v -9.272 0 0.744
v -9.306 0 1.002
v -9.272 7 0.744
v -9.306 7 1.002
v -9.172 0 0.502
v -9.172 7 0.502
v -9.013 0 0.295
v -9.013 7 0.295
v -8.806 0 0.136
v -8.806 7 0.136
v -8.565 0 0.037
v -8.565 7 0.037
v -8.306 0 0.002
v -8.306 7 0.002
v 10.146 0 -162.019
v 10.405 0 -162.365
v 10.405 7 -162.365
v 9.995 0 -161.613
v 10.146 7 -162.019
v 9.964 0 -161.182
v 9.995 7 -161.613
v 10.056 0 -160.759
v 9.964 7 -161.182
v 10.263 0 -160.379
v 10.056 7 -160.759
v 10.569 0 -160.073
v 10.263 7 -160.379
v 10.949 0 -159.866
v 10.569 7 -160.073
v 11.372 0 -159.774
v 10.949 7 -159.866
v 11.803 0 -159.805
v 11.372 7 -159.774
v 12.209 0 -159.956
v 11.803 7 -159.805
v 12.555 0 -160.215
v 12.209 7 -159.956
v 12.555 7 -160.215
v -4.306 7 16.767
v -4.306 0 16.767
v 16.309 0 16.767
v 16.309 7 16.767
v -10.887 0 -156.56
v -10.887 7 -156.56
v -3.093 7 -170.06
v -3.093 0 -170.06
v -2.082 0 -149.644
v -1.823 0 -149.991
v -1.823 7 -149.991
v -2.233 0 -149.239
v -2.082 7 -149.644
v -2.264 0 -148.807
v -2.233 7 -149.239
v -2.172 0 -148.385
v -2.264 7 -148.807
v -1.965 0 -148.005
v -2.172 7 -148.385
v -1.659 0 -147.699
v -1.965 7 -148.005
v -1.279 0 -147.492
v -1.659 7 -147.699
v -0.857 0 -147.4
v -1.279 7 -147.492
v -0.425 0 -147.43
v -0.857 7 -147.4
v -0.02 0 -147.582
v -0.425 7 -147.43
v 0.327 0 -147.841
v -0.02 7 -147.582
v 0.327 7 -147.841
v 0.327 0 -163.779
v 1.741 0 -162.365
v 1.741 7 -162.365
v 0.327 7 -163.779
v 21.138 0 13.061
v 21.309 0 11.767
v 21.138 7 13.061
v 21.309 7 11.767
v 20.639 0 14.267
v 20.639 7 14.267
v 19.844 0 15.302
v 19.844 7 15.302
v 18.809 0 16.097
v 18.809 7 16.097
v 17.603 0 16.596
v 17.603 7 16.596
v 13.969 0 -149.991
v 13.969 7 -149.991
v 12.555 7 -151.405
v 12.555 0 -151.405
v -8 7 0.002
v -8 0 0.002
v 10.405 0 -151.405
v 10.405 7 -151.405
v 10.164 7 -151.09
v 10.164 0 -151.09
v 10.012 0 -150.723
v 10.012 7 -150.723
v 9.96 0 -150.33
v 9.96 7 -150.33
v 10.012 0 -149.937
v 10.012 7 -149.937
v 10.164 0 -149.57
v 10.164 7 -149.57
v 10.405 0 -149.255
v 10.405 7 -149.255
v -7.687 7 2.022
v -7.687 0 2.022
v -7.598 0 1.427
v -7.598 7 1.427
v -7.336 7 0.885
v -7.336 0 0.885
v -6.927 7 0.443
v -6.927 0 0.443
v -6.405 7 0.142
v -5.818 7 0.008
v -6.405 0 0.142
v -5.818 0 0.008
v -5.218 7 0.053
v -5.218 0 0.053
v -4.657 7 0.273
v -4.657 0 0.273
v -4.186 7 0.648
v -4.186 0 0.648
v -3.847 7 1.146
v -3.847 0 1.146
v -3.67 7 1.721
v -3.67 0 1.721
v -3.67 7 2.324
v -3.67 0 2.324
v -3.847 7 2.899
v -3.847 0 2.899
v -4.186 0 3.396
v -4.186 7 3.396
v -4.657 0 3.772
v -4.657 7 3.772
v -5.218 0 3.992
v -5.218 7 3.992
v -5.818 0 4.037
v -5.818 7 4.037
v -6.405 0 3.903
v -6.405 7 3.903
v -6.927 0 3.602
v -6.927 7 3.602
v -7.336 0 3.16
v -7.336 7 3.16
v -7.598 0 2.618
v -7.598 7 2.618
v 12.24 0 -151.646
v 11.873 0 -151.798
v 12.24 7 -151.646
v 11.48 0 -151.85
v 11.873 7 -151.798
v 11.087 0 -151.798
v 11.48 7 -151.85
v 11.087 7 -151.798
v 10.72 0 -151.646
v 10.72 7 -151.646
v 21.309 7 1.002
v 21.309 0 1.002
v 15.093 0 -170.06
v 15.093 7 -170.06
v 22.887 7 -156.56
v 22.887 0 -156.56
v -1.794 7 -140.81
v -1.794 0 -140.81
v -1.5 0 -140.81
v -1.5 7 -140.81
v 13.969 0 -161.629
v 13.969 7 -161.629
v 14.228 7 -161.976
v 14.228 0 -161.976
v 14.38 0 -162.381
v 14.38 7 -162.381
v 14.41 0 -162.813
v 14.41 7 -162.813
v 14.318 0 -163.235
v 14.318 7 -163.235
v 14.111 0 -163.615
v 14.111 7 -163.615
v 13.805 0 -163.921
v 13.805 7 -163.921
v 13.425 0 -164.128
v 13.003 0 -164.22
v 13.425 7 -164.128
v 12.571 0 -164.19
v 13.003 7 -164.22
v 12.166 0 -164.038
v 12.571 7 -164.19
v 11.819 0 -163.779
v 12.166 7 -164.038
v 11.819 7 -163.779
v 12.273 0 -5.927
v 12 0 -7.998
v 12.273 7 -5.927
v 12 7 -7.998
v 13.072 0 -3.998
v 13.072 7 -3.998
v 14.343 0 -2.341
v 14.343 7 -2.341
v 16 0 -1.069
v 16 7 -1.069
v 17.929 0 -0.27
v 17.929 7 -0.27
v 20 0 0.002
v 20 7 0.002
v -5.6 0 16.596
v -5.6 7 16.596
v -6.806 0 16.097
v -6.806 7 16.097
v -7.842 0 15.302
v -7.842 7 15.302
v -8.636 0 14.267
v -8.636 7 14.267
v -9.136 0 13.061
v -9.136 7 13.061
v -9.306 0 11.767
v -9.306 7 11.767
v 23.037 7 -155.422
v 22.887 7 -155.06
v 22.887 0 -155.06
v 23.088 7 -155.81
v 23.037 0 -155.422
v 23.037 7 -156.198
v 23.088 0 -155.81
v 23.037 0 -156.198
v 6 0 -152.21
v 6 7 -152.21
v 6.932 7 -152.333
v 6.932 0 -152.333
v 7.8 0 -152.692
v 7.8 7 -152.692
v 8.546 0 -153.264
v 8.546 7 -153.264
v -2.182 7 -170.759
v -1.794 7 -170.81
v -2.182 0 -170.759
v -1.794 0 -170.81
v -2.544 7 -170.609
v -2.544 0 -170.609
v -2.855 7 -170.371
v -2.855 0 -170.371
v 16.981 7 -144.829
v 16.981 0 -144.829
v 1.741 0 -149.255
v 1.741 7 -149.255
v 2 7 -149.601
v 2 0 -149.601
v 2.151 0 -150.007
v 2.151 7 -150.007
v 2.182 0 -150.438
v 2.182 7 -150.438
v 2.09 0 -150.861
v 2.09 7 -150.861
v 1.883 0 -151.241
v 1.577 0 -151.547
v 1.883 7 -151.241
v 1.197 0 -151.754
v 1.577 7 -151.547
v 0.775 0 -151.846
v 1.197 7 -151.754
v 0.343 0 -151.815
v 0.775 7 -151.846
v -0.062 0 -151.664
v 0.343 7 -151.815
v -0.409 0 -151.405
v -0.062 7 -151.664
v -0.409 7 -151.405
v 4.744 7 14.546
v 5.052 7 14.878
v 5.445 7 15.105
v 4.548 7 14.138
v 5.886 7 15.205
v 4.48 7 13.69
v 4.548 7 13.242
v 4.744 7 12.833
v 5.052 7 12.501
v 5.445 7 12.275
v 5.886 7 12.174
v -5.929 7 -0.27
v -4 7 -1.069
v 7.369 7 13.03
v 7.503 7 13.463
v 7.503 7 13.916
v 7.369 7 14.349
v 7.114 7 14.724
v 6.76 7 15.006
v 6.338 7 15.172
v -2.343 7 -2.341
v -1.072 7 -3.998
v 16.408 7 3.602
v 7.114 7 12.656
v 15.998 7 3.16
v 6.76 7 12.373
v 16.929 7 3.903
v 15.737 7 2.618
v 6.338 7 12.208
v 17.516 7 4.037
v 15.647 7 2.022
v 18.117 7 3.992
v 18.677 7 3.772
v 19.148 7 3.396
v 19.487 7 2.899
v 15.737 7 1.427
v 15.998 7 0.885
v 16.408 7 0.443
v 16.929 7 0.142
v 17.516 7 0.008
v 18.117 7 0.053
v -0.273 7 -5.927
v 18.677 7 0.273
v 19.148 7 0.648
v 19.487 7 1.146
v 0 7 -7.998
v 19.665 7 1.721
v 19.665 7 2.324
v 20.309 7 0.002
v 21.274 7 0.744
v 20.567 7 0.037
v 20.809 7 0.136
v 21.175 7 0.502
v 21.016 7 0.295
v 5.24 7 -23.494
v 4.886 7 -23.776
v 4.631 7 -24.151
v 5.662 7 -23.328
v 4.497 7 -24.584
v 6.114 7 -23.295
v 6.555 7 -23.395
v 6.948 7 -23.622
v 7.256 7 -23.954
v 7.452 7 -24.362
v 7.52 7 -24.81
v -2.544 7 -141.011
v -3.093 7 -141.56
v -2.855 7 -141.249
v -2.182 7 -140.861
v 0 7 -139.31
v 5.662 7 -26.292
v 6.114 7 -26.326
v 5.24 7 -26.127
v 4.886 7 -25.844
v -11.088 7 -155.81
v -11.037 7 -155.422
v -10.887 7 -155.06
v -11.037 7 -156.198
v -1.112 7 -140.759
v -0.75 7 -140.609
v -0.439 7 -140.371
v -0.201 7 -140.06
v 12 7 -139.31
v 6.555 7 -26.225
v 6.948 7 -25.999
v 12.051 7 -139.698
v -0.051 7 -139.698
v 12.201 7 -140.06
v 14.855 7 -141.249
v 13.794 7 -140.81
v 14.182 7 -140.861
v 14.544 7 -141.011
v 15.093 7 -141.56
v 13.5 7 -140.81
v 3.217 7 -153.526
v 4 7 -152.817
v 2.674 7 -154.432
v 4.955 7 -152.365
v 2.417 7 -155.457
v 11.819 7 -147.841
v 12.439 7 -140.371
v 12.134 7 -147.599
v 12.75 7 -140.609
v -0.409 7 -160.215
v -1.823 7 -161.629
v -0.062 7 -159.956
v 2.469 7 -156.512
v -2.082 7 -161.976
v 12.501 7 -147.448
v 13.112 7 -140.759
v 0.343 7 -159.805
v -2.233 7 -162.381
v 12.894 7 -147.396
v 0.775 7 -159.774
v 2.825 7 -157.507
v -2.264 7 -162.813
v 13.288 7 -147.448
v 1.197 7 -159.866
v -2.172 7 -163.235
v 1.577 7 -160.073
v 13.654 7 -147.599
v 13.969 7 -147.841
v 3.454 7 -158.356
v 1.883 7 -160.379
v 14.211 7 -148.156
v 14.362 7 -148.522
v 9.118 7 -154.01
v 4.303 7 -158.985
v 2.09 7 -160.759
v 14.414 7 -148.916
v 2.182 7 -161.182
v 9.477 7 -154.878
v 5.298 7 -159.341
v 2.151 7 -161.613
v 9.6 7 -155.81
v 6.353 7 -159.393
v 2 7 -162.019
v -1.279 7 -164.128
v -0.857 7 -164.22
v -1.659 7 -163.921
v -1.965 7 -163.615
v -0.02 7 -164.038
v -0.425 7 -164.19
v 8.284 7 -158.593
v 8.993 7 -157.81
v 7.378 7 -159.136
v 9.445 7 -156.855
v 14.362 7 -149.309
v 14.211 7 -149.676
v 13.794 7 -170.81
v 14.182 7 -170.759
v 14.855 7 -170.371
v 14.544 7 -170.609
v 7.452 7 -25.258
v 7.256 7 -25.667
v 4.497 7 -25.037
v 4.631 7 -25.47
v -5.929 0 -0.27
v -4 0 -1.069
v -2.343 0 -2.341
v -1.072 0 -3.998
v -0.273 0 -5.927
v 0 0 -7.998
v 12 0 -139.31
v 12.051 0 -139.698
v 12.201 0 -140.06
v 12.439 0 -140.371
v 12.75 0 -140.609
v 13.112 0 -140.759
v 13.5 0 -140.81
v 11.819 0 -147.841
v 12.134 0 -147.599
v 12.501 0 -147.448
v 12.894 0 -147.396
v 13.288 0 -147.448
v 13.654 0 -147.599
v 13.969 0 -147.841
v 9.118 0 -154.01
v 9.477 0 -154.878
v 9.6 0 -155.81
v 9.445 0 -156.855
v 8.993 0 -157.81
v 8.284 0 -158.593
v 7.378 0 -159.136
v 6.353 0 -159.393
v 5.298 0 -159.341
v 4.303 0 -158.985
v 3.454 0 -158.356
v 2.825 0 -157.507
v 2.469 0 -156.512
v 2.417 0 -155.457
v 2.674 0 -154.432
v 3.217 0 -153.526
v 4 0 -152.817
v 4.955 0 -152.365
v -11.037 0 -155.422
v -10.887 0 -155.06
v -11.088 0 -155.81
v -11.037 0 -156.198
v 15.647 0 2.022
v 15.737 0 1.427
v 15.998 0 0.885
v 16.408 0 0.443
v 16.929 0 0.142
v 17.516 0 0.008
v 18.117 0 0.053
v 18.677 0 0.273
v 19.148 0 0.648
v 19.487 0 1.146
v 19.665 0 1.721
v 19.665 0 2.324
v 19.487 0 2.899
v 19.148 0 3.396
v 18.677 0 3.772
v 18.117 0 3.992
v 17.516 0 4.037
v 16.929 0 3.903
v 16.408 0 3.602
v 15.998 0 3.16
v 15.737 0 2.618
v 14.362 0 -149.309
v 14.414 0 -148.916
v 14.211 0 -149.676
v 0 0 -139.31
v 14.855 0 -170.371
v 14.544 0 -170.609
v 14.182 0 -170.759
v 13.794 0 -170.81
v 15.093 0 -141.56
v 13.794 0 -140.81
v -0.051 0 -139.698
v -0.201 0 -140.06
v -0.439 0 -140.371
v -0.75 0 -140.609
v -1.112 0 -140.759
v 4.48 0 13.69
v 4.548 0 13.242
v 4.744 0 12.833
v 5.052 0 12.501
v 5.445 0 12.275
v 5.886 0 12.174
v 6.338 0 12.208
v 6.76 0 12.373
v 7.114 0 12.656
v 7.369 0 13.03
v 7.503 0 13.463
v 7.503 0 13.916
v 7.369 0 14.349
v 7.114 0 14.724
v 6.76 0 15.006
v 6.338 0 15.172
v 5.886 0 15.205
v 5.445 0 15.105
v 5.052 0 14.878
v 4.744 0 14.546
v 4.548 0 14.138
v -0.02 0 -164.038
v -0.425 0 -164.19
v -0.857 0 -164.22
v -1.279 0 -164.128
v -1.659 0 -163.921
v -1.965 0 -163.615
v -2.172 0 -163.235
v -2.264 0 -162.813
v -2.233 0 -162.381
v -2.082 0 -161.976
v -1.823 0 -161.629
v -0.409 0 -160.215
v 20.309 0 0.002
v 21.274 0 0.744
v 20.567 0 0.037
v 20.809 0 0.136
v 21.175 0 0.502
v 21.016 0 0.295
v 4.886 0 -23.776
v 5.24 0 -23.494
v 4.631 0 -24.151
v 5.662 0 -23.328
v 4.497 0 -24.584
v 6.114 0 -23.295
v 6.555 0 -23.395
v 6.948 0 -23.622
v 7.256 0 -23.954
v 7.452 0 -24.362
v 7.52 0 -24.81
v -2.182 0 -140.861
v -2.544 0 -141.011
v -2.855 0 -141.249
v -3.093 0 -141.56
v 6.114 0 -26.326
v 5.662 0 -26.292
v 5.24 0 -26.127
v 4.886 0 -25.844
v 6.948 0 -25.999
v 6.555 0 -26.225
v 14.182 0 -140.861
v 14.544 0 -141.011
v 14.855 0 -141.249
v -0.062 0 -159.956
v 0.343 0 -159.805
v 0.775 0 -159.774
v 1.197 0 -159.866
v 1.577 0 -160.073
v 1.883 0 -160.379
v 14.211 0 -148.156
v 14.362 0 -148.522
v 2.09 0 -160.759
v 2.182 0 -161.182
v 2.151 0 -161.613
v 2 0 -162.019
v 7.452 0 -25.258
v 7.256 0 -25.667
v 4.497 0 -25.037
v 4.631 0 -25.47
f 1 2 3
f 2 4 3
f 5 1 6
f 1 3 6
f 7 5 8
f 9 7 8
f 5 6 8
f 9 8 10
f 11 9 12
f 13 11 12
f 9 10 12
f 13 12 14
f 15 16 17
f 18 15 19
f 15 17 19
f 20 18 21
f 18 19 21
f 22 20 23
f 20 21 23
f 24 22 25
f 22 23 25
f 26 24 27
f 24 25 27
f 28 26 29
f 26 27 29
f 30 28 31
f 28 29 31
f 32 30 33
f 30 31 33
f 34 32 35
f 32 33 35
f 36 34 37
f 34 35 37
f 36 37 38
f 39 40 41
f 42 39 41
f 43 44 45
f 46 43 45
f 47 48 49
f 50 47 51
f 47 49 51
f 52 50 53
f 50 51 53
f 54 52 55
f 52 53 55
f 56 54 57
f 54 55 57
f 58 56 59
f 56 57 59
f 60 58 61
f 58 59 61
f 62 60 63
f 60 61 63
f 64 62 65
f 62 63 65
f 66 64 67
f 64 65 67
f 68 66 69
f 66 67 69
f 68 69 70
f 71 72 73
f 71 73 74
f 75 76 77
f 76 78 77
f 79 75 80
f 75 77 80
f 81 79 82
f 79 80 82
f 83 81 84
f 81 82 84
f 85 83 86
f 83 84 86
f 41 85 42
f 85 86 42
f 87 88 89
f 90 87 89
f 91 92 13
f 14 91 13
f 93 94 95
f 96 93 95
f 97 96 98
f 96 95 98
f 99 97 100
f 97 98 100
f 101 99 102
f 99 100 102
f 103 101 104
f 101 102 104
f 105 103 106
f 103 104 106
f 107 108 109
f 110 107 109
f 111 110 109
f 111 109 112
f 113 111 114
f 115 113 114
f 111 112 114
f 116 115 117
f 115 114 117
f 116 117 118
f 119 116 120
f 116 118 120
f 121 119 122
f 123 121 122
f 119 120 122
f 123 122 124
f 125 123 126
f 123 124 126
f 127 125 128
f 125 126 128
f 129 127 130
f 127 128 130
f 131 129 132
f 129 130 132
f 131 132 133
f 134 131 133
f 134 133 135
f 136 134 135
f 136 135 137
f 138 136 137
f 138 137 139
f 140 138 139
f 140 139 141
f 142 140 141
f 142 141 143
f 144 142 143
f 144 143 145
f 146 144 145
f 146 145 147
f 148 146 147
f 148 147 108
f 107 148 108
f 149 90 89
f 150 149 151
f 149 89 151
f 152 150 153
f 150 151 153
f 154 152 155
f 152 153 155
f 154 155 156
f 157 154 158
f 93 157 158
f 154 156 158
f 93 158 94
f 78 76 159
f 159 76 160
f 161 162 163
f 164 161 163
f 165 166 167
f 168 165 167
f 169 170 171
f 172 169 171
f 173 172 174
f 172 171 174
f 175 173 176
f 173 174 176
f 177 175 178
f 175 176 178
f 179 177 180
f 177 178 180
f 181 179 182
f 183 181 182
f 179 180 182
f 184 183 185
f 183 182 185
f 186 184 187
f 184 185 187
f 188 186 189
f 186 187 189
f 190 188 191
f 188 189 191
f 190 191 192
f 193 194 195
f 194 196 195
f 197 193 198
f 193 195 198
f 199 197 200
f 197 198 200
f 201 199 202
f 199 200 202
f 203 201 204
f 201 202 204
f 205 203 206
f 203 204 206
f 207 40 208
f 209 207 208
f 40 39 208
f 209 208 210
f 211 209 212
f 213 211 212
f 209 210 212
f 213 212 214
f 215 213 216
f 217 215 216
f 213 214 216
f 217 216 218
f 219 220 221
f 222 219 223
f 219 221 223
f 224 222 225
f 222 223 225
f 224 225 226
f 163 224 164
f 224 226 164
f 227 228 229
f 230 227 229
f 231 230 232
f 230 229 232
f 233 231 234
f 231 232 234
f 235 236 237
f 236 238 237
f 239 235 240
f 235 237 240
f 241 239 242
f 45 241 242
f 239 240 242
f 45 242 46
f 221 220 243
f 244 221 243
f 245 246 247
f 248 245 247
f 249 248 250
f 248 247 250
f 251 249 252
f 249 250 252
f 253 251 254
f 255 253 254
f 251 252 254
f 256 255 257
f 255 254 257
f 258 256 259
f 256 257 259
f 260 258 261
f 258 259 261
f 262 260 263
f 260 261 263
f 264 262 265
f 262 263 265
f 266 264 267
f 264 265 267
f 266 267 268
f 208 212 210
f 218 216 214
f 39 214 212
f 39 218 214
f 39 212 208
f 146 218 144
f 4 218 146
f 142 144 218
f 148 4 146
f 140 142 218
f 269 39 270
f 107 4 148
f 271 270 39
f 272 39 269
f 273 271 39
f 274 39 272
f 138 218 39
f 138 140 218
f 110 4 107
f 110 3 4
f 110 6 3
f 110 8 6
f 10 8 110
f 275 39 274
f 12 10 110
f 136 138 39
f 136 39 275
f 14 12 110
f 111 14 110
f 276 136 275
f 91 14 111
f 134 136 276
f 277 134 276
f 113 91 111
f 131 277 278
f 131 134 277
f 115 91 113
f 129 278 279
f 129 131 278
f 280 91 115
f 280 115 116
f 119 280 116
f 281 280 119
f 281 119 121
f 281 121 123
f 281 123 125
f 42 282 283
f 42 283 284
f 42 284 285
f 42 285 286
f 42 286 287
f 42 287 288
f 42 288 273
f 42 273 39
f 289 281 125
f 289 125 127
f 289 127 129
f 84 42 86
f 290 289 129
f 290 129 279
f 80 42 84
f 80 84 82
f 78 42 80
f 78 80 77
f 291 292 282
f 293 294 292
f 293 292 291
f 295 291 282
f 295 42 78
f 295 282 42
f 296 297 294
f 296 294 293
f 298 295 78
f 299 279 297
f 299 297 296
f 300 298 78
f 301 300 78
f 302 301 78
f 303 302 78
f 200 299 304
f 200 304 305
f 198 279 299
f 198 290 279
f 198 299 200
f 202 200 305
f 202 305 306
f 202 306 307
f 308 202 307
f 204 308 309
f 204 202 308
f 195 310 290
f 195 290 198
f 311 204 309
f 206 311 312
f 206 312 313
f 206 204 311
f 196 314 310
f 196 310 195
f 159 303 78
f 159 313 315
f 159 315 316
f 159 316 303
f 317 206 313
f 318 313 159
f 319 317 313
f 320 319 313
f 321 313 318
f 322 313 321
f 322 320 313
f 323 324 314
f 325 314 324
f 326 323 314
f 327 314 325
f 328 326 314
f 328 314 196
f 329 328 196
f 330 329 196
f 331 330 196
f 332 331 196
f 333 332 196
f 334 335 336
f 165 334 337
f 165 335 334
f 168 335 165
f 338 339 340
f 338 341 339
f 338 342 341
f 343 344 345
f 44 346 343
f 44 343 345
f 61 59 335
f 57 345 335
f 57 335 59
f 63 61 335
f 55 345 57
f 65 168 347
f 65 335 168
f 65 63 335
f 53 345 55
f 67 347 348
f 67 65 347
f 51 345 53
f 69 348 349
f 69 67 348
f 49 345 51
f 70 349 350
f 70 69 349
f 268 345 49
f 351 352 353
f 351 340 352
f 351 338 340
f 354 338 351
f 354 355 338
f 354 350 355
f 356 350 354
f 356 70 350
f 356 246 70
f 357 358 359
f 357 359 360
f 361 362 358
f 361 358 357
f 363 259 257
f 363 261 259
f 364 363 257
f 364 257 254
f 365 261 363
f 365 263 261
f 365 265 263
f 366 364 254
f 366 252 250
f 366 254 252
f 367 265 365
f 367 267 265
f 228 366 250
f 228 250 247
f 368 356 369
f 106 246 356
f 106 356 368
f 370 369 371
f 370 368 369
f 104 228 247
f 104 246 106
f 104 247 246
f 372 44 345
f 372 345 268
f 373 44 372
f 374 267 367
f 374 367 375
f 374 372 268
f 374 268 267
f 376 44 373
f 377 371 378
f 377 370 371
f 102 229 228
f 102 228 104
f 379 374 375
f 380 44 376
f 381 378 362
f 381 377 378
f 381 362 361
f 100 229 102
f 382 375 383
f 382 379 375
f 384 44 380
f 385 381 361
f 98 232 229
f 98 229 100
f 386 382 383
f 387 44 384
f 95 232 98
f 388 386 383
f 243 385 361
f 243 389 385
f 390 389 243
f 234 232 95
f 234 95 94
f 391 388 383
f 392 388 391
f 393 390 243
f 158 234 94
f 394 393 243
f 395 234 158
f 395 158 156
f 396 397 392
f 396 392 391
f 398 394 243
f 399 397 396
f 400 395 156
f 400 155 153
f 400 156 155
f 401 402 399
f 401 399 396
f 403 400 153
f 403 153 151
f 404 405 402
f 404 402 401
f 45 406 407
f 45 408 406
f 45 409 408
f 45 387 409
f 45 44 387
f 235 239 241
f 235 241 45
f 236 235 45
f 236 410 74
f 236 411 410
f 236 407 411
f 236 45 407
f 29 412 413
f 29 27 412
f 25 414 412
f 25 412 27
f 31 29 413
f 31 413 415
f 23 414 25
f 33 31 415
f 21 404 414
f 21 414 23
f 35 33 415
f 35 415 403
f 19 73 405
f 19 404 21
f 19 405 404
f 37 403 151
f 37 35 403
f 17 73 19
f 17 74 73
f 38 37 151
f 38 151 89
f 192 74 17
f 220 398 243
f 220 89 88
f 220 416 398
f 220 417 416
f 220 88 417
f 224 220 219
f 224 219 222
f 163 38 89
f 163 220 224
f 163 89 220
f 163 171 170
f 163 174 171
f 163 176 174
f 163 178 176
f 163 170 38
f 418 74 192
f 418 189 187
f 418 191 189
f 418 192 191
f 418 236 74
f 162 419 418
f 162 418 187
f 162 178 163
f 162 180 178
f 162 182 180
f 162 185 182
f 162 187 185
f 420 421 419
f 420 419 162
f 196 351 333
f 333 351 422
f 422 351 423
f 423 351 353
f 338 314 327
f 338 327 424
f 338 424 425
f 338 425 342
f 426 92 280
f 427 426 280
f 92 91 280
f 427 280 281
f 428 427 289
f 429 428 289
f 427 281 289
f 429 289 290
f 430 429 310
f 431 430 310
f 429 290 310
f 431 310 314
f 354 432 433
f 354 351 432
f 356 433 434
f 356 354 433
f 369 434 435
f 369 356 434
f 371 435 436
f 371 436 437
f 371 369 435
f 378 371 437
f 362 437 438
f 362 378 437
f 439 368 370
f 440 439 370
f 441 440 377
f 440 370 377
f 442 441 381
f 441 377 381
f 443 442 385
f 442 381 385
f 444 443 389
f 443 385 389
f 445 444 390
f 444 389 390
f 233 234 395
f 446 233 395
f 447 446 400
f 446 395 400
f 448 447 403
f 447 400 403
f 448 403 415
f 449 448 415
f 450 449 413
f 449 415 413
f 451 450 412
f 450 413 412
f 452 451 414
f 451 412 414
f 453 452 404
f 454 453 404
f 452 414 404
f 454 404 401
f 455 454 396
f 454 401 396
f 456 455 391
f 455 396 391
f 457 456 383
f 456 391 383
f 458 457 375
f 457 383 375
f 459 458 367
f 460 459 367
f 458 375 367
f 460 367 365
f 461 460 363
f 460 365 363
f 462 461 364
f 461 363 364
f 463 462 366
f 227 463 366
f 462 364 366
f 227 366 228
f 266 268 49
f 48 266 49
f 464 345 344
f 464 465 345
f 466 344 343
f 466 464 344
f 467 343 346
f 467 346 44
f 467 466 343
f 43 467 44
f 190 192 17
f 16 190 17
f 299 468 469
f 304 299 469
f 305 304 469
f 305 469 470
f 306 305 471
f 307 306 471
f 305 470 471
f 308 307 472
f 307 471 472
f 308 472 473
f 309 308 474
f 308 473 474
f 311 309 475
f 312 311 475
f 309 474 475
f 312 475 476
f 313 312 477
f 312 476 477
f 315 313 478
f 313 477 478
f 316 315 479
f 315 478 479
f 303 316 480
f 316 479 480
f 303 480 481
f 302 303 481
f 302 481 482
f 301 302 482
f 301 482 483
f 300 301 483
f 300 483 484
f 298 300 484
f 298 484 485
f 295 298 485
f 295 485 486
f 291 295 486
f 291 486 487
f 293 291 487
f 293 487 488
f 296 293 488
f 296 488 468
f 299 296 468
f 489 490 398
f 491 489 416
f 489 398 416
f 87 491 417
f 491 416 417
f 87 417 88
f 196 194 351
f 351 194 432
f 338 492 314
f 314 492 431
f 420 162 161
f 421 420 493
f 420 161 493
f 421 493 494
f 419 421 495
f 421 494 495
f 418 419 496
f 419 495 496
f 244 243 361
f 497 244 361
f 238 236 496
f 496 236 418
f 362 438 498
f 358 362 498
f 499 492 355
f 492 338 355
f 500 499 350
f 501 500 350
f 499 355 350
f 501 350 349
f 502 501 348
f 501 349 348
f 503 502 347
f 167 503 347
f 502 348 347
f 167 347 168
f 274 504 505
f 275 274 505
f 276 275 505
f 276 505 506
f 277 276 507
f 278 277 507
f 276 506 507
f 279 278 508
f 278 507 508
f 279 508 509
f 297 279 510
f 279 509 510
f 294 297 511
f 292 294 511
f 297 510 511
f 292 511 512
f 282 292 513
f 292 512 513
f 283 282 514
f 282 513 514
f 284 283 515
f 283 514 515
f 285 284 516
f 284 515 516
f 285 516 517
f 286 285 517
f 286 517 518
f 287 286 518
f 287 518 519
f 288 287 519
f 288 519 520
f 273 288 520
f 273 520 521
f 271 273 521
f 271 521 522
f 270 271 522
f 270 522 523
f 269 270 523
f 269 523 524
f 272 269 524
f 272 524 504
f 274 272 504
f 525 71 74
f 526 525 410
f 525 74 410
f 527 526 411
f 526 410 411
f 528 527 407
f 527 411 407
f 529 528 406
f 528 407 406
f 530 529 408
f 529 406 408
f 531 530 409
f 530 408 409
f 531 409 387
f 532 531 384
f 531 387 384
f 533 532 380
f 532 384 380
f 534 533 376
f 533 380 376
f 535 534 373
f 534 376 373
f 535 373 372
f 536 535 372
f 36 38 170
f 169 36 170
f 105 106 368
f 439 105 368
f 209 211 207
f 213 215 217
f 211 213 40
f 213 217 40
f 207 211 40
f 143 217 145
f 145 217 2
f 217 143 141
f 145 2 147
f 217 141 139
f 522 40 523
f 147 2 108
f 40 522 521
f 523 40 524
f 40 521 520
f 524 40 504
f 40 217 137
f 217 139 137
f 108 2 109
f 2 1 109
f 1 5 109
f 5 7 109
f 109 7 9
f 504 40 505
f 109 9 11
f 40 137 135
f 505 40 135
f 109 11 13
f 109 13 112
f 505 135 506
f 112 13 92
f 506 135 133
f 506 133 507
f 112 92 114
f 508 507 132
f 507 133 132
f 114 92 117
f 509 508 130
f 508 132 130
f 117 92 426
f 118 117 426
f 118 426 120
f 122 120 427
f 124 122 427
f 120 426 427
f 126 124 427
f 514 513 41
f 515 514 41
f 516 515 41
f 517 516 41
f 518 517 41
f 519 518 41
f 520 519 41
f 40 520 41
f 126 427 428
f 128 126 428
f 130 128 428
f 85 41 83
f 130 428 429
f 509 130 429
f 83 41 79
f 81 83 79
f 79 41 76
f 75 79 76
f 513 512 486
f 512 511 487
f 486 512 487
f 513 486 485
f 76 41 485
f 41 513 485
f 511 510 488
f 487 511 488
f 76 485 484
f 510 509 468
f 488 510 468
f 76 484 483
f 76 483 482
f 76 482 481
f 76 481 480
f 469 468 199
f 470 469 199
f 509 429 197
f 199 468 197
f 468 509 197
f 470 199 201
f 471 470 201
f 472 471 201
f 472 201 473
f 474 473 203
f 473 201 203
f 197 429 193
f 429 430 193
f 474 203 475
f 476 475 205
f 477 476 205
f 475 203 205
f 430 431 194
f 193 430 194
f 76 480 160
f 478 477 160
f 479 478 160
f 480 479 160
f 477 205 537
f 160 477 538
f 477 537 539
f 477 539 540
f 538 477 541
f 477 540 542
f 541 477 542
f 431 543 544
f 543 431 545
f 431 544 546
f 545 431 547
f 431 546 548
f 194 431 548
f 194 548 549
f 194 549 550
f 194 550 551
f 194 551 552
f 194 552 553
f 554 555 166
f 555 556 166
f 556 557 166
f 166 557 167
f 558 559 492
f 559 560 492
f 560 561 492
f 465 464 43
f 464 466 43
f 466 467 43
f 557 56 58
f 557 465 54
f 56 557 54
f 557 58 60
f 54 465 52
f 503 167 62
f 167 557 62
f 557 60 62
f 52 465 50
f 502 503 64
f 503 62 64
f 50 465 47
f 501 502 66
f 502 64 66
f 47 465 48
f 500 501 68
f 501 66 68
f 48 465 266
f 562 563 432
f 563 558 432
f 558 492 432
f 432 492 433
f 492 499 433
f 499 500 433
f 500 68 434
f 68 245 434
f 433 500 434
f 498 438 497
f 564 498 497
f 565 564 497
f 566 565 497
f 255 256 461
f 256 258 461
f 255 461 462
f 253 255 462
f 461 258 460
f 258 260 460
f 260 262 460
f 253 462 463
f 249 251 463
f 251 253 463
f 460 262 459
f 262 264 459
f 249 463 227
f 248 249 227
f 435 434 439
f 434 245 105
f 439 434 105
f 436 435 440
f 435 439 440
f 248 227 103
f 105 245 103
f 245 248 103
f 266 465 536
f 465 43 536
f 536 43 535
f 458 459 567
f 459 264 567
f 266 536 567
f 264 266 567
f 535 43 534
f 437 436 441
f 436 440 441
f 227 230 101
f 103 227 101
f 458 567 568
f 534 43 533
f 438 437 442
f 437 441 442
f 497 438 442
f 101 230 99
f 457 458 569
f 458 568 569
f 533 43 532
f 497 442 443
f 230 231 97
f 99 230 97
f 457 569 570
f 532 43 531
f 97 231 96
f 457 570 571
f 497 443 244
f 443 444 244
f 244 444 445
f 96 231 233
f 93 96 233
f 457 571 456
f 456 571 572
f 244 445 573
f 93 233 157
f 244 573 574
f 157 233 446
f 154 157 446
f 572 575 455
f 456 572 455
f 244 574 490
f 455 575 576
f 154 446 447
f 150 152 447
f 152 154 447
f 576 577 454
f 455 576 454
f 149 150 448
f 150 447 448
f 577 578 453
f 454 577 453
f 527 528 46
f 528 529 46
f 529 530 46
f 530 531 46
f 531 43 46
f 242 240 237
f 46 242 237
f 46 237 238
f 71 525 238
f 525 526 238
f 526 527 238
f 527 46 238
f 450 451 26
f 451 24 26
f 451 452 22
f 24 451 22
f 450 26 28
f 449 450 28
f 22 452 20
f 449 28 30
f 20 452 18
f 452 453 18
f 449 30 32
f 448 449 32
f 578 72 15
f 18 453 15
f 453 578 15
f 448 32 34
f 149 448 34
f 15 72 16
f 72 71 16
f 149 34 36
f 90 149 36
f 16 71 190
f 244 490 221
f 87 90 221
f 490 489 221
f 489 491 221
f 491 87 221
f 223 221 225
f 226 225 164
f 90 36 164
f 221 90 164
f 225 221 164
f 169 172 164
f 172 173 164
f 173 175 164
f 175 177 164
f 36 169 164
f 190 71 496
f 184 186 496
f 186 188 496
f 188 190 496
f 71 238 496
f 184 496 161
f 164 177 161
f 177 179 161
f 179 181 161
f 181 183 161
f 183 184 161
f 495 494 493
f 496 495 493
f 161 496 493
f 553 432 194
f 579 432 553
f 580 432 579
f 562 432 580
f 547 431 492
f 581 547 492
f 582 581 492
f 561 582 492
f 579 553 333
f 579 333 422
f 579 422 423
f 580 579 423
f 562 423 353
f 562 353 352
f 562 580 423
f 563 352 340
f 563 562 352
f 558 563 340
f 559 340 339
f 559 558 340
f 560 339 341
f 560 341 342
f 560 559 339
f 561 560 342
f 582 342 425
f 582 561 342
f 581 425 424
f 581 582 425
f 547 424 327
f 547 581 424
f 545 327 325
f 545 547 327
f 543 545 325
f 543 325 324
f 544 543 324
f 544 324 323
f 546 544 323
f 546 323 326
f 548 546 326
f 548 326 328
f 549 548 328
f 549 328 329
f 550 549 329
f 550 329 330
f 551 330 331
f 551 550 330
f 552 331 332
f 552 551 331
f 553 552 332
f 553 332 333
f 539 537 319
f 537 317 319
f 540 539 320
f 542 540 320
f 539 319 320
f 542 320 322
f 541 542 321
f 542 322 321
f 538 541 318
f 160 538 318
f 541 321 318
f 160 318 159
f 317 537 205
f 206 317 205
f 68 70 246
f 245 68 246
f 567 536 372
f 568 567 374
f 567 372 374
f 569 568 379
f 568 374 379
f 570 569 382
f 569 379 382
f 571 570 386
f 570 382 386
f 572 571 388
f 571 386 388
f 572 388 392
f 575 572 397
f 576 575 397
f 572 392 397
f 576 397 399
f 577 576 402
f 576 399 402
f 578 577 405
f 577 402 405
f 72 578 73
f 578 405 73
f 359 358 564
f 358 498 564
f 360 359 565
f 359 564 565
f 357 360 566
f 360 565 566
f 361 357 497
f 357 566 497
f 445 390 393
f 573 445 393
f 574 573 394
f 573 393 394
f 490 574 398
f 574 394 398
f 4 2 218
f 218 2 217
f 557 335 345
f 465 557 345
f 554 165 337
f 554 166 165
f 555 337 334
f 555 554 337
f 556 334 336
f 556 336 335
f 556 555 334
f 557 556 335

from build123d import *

# Parameters (mm, degrees)
SKETCH_1_R          = 1.52
EXTRUDE_1_DEPTH     = 7
SKETCH_2_R          = 1.52
SKETCH_2_R_2        = 1.520000001
CUT_EXTRUDE_2_DEPTH = 10
FILLET_1_R          = 8
FILLET_3_R          = 1
FILLET_4_R          = 5
FILLET_5_R          = 1.5
SKETCH_3_R          = 2.02
SKETCH_3_R_2        = 1.52
CUT_EXTRUDE_3_DEPTH = 10


with BuildPart() as part:
    # 草图1 → 凸台-拉伸1 (new body)
    with BuildSketch(Plane(origin=(0, 0, 0), x_dir=(1, 0, 0), z_dir=(0, 1, 0))):
        Polygon((12, -0.002444932), (12, 140.81), (30.355391701, 140.81), (30.355391701, 181.996219272), (-18.063025957, 181.996219272), (-18.063025957, 140.81), (0, 140.81), (0, -0.002444932), (-9.306341863, -0.002444932), (-9.306341863, -16.766517892), (21.308530359, -16.766517892), (21.308530359, -0.002444932), align=None)
        with Locations((6, 24.810293178)):
            Circle(SKETCH_1_R, mode=Mode.SUBTRACT)
    extrude(amount=EXTRUDE_1_DEPTH)

    # 草图2 → 切除-拉伸2 (cut)
    with BuildSketch(Plane(origin=(0, 7, 0), x_dir=(1, 0, 0), z_dir=(0, 1, 0))):
        with BuildLine():
            ThreePointArc((9.6, 155.810000018), (3.454415588, 158.35558443), (6, 152.210000018))
            Line((6, 152.210000018), (6, 155.810000018))
            Line((6, 155.810000018), (9.6, 155.810000018))
        make_face()
        with BuildLine():
            Line((6, 155.810000018), (6, 152.210000018))
            ThreePointArc((6, 152.210000018), (7.377660354, 152.4840337), (8.545584409, 153.264415603))
            Line((8.545584409, 153.264415603), (6, 155.810000018))
        make_face()
        with BuildLine():
            Line((9.6, 155.810000018), (6, 155.810000018))
            Line((6, 155.810000018), (8.545584409, 153.264415603))
            ThreePointArc((8.545584409, 153.264415603), (9.325966316, 154.43233966), (9.6, 155.810000018))
        make_face()
        with Locations((-0.748108245, 148.915708883)):
            Circle(SKETCH_2_R)
        with Locations((0.666105318, 150.329922446)):
            Circle(SKETCH_2_R)
        with BuildLine():
            Line((-0.40869699, 151.404724753), (-1.822910552, 149.990511191))
            ThreePointArc((-1.822910552, 149.990511191), (-1.376757591, 150.299616395), (-0.850445717, 150.432259918))
            ThreePointArc((-0.850445717, 150.432259918), (-0.717802194, 150.958571792), (-0.40869699, 151.404724753))
        make_face()
        with BuildLine():
            ThreePointArc((0.76844279, 148.813371411), (0.635799267, 148.287059538), (0.326694063, 147.840906576))
            Line((0.326694063, 147.840906576), (1.740907625, 149.255120138))
            ThreePointArc((1.740907625, 149.255120138), (1.294754663, 148.946014934), (0.76844279, 148.813371411))
        make_face()
        with BuildLine():
            Line((10.405275239, 149.255120151), (11.819488799, 147.840906587))
            ThreePointArc((11.819488799, 147.840906586), (11.510383595, 148.287059549), (11.377740072, 148.813371422))
            ThreePointArc((11.377740072, 148.813371422), (10.851428199, 148.946014947), (10.405275239, 149.255120151))
        make_face()
        with BuildLine():
            Line((11.480077548, 150.329922457), (10.405275241, 151.404724766))
            ThreePointArc((10.405275241, 151.404724766), (9.960077548, 150.329922459), (10.405275239, 149.255120151))
            ThreePointArc((10.405275239, 149.255120151), (10.851428199, 148.946014947), (11.377740072, 148.813371422))
            ThreePointArc((11.377740072, 148.813371422), (11.471198506, 149.449757066), (11.819488801, 149.990511203))
            Line((11.819488801, 149.990511203), (11.480077548, 150.329922457))
        make_face()
        with BuildLine():
            Line((12.554879856, 151.404724763), (11.480077548, 150.329922457))
            Line((11.480077548, 150.329922457), (11.819488801, 149.990511203))
            ThreePointArc((11.819488801, 149.990511203), (12.360242939, 150.338801496), (12.996628583, 150.432259929))
            ThreePointArc((12.996628583, 150.432259929), (12.863985059, 150.958571802), (12.554879856, 151.404724763))
        make_face()
        with BuildLine():
            Line((11.819488801, 149.990511203), (12.554879854, 149.255120148))
            ThreePointArc((12.554879854, 149.255120148), (12.884374437, 149.748243639), (13.000077548, 150.329922457))
            ThreePointArc((13.000077548, 150.329922457), (12.999215062, 150.381120244), (12.996628583, 150.432259929))
            ThreePointArc((12.996628583, 150.432259929), (12.360242939, 150.338801496), (11.819488801, 149.990511203))
        make_face()
        with BuildLine():
            ThreePointArc((11.377740072, 148.813371422), (12.014125716, 148.906829855), (12.554879854, 149.255120148))
            Line((12.554879854, 149.255120148), (11.819488801, 149.990511203))
            ThreePointArc((11.819488801, 149.990511203), (11.471198506, 149.449757066), (11.377740072, 148.813371422))
        make_face()
        with BuildLine():
            ThreePointArc((12.554879856, 151.404724763), (11.480077549, 151.849922457), (10.405275241, 151.404724766))
            Line((10.405275241, 151.404724766), (11.480077548, 150.329922457))
            Line((11.480077548, 150.329922457), (12.554879856, 151.404724763))
        make_face()
        with BuildLine():
            Line((13.969093417, 149.990511199), (12.554879856, 151.404724763))
            ThreePointArc((12.554879856, 151.404724763), (12.863985059, 150.958571802), (12.996628583, 150.432259929))
            ThreePointArc((12.996628583, 150.432259929), (13.522940456, 150.299616405), (13.969093418, 149.9905112))
        make_face()
        with BuildLine():
            Line((12.554879854, 149.255120148), (12.894291108, 148.915708893))
            Line((12.894291108, 148.915708893), (13.969093417, 149.990511199))
            ThreePointArc((13.969093418, 149.9905112), (13.522940456, 150.299616405), (12.996628583, 150.432259929))
            ThreePointArc((12.996628583, 150.432259929), (12.999215062, 150.381120244), (13.000077548, 150.329922457))
            ThreePointArc((13.000077548, 150.329922457), (12.884374437, 149.748243639), (12.554879854, 149.255120148))
        make_face()
        with BuildLine():
            Line((12.894291108, 148.915708893), (13.969093415, 147.840906584))
            ThreePointArc((13.969093415, 147.840906584), (14.298587998, 148.334030075), (14.414291109, 148.915708893))
            ThreePointArc((14.414291109, 148.915708893), (14.298587999, 149.49738771), (13.969093418, 149.9905112))
            Line((13.969093417, 149.990511199), (12.894291108, 148.915708893))
        make_face()
        with Locations((11.480077548, 161.290077579)):
            Circle(SKETCH_2_R)
        with Locations((12.894291108, 162.704291143)):
            Circle(SKETCH_2_R_2)
        with BuildLine():
            ThreePointArc((11.377740072, 162.806628614), (11.510383595, 163.332940488), (11.819488799, 163.77909345))
            Line((11.819488799, 163.779093449), (10.405275239, 162.364879885))
            ThreePointArc((10.405275239, 162.364879885), (10.851428199, 162.673985089), (11.377740072, 162.806628614))
        make_face()
        with BuildLine():
            ThreePointArc((12.996628583, 161.187740107), (12.863985059, 160.661428234), (12.554879856, 160.215275273))
            Line((12.554879856, 160.215275273), (13.969093417, 161.629488837))
            ThreePointArc((13.969093418, 161.629488836), (13.522940456, 161.320383631), (12.996628583, 161.187740107))
        make_face()
        with Locations((0.666105329, 161.290077566)):
            Circle(SKETCH_2_R)
        with Locations((-0.74810823, 162.704291131)):
            Circle(SKETCH_2_R)
        with BuildLine():
            Line((1.740907642, 162.364879874), (0.326694079, 163.779093436))
            ThreePointArc((0.326694079, 163.779093436), (0.635799282, 163.332940474), (0.768442805, 162.8066286))
            ThreePointArc((0.768442805, 162.8066286), (1.294754678, 162.673985076), (1.740907639, 162.364879871))
        make_face()
        with BuildLine():
            ThreePointArc((-0.850445706, 161.187740096), (-1.376757579, 161.320383621), (-1.82291054, 161.629488826))
            Line((-1.82291054, 161.629488826), (-0.408696978, 160.215275263))
            ThreePointArc((-0.408696981, 160.21527526), (-0.717802184, 160.661428223), (-0.850445706, 161.187740096))
        make_face()
        Polygon((-18.063025957, 181.996219272), (-18.063025957, 140.81), (-2.660254048, 140.81), (-11.320508097, 155.810000018), (-2.660254048, 170.810000036), (14.660254048, 170.810000036), (23.320508097, 155.810000018), (16.980762117, 144.829237874), (14.660254048, 140.81), (30.355391701, 140.81), (30.355391701, 181.996219272), align=None)
        with BuildLine():
            ThreePointArc((11.819488799, 147.840906586), (12.894291106, 147.395708892), (13.969093415, 147.840906584))
            Line((13.969093415, 147.840906584), (12.894291108, 148.915708893))
            Line((12.894291108, 148.915708893), (12.554879854, 149.255120148))
            ThreePointArc((12.554879854, 149.255120148), (12.014125716, 148.906829855), (11.377740072, 148.813371422))
            ThreePointArc((11.377740072, 148.813371422), (11.510383595, 148.287059549), (11.819488799, 147.840906586))
        make_face()
    extrude(amount=-CUT_EXTRUDE_2_DEPTH, mode=Mode.SUBTRACT)

    # 圆角1
    fillet_1_edges = [part.edges().sort_by_distance(p)[0] for p in [
        (0, 3.5, 0.002444932),
        (12, 3.5, 0.002444932),
    ]]
    fillet(fillet_1_edges, radius=FILLET_1_R)

    # 圆角3
    fillet_3_edges = [part.edges().sort_by_distance(p)[0] for p in [
        (-9.306341863, 3.5, 0.002444932),
        (21.308530359, 3.5, 0.002444932),
    ]]
    fillet(fillet_3_edges, radius=FILLET_3_R)

    # 圆角4
    fillet_4_edges = [part.edges().sort_by_distance(p)[0] for p in [
        (21.308530359, 3.5, 16.766517892),
        (-9.306341863, 3.5, 16.766517892),
    ]]
    fillet(fillet_4_edges, radius=FILLET_4_R)

    # 圆角5
    fillet_5_edges = [part.edges().sort_by_distance(p)[0] for p in [
        (0, 3.5, -140.81),
        (12, 3.5, -140.81),
        (-11.320508097, 3.5, -155.810000018),
        (-2.660254048, 3.5, -140.81),
        (14.660254048, 3.5, -140.81),
        (23.320508097, 3.5, -155.810000018),
        (14.660254048, 3.5, -170.810000036),
        (-2.660254048, 3.5, -170.810000036),
    ]]
    fillet(fillet_5_edges, radius=FILLET_5_R)

    # 草图3 → 切除-拉伸3 (cut)
    with BuildSketch(Plane(origin=(0, 0, 0), x_dir=(-1, 0, 0), z_dir=(0, -1, 0))):
        with Locations((-17.66726189, -2.022444932)):
            Circle(SKETCH_3_R)
        with Locations((5.66726189, -2.022444932)):
            Circle(SKETCH_3_R)
        with Locations((-6, -13.689706822)):
            Circle(SKETCH_3_R_2)
    extrude(amount=-CUT_EXTRUDE_3_DEPTH, mode=Mode.SUBTRACT)


solid = part.part
